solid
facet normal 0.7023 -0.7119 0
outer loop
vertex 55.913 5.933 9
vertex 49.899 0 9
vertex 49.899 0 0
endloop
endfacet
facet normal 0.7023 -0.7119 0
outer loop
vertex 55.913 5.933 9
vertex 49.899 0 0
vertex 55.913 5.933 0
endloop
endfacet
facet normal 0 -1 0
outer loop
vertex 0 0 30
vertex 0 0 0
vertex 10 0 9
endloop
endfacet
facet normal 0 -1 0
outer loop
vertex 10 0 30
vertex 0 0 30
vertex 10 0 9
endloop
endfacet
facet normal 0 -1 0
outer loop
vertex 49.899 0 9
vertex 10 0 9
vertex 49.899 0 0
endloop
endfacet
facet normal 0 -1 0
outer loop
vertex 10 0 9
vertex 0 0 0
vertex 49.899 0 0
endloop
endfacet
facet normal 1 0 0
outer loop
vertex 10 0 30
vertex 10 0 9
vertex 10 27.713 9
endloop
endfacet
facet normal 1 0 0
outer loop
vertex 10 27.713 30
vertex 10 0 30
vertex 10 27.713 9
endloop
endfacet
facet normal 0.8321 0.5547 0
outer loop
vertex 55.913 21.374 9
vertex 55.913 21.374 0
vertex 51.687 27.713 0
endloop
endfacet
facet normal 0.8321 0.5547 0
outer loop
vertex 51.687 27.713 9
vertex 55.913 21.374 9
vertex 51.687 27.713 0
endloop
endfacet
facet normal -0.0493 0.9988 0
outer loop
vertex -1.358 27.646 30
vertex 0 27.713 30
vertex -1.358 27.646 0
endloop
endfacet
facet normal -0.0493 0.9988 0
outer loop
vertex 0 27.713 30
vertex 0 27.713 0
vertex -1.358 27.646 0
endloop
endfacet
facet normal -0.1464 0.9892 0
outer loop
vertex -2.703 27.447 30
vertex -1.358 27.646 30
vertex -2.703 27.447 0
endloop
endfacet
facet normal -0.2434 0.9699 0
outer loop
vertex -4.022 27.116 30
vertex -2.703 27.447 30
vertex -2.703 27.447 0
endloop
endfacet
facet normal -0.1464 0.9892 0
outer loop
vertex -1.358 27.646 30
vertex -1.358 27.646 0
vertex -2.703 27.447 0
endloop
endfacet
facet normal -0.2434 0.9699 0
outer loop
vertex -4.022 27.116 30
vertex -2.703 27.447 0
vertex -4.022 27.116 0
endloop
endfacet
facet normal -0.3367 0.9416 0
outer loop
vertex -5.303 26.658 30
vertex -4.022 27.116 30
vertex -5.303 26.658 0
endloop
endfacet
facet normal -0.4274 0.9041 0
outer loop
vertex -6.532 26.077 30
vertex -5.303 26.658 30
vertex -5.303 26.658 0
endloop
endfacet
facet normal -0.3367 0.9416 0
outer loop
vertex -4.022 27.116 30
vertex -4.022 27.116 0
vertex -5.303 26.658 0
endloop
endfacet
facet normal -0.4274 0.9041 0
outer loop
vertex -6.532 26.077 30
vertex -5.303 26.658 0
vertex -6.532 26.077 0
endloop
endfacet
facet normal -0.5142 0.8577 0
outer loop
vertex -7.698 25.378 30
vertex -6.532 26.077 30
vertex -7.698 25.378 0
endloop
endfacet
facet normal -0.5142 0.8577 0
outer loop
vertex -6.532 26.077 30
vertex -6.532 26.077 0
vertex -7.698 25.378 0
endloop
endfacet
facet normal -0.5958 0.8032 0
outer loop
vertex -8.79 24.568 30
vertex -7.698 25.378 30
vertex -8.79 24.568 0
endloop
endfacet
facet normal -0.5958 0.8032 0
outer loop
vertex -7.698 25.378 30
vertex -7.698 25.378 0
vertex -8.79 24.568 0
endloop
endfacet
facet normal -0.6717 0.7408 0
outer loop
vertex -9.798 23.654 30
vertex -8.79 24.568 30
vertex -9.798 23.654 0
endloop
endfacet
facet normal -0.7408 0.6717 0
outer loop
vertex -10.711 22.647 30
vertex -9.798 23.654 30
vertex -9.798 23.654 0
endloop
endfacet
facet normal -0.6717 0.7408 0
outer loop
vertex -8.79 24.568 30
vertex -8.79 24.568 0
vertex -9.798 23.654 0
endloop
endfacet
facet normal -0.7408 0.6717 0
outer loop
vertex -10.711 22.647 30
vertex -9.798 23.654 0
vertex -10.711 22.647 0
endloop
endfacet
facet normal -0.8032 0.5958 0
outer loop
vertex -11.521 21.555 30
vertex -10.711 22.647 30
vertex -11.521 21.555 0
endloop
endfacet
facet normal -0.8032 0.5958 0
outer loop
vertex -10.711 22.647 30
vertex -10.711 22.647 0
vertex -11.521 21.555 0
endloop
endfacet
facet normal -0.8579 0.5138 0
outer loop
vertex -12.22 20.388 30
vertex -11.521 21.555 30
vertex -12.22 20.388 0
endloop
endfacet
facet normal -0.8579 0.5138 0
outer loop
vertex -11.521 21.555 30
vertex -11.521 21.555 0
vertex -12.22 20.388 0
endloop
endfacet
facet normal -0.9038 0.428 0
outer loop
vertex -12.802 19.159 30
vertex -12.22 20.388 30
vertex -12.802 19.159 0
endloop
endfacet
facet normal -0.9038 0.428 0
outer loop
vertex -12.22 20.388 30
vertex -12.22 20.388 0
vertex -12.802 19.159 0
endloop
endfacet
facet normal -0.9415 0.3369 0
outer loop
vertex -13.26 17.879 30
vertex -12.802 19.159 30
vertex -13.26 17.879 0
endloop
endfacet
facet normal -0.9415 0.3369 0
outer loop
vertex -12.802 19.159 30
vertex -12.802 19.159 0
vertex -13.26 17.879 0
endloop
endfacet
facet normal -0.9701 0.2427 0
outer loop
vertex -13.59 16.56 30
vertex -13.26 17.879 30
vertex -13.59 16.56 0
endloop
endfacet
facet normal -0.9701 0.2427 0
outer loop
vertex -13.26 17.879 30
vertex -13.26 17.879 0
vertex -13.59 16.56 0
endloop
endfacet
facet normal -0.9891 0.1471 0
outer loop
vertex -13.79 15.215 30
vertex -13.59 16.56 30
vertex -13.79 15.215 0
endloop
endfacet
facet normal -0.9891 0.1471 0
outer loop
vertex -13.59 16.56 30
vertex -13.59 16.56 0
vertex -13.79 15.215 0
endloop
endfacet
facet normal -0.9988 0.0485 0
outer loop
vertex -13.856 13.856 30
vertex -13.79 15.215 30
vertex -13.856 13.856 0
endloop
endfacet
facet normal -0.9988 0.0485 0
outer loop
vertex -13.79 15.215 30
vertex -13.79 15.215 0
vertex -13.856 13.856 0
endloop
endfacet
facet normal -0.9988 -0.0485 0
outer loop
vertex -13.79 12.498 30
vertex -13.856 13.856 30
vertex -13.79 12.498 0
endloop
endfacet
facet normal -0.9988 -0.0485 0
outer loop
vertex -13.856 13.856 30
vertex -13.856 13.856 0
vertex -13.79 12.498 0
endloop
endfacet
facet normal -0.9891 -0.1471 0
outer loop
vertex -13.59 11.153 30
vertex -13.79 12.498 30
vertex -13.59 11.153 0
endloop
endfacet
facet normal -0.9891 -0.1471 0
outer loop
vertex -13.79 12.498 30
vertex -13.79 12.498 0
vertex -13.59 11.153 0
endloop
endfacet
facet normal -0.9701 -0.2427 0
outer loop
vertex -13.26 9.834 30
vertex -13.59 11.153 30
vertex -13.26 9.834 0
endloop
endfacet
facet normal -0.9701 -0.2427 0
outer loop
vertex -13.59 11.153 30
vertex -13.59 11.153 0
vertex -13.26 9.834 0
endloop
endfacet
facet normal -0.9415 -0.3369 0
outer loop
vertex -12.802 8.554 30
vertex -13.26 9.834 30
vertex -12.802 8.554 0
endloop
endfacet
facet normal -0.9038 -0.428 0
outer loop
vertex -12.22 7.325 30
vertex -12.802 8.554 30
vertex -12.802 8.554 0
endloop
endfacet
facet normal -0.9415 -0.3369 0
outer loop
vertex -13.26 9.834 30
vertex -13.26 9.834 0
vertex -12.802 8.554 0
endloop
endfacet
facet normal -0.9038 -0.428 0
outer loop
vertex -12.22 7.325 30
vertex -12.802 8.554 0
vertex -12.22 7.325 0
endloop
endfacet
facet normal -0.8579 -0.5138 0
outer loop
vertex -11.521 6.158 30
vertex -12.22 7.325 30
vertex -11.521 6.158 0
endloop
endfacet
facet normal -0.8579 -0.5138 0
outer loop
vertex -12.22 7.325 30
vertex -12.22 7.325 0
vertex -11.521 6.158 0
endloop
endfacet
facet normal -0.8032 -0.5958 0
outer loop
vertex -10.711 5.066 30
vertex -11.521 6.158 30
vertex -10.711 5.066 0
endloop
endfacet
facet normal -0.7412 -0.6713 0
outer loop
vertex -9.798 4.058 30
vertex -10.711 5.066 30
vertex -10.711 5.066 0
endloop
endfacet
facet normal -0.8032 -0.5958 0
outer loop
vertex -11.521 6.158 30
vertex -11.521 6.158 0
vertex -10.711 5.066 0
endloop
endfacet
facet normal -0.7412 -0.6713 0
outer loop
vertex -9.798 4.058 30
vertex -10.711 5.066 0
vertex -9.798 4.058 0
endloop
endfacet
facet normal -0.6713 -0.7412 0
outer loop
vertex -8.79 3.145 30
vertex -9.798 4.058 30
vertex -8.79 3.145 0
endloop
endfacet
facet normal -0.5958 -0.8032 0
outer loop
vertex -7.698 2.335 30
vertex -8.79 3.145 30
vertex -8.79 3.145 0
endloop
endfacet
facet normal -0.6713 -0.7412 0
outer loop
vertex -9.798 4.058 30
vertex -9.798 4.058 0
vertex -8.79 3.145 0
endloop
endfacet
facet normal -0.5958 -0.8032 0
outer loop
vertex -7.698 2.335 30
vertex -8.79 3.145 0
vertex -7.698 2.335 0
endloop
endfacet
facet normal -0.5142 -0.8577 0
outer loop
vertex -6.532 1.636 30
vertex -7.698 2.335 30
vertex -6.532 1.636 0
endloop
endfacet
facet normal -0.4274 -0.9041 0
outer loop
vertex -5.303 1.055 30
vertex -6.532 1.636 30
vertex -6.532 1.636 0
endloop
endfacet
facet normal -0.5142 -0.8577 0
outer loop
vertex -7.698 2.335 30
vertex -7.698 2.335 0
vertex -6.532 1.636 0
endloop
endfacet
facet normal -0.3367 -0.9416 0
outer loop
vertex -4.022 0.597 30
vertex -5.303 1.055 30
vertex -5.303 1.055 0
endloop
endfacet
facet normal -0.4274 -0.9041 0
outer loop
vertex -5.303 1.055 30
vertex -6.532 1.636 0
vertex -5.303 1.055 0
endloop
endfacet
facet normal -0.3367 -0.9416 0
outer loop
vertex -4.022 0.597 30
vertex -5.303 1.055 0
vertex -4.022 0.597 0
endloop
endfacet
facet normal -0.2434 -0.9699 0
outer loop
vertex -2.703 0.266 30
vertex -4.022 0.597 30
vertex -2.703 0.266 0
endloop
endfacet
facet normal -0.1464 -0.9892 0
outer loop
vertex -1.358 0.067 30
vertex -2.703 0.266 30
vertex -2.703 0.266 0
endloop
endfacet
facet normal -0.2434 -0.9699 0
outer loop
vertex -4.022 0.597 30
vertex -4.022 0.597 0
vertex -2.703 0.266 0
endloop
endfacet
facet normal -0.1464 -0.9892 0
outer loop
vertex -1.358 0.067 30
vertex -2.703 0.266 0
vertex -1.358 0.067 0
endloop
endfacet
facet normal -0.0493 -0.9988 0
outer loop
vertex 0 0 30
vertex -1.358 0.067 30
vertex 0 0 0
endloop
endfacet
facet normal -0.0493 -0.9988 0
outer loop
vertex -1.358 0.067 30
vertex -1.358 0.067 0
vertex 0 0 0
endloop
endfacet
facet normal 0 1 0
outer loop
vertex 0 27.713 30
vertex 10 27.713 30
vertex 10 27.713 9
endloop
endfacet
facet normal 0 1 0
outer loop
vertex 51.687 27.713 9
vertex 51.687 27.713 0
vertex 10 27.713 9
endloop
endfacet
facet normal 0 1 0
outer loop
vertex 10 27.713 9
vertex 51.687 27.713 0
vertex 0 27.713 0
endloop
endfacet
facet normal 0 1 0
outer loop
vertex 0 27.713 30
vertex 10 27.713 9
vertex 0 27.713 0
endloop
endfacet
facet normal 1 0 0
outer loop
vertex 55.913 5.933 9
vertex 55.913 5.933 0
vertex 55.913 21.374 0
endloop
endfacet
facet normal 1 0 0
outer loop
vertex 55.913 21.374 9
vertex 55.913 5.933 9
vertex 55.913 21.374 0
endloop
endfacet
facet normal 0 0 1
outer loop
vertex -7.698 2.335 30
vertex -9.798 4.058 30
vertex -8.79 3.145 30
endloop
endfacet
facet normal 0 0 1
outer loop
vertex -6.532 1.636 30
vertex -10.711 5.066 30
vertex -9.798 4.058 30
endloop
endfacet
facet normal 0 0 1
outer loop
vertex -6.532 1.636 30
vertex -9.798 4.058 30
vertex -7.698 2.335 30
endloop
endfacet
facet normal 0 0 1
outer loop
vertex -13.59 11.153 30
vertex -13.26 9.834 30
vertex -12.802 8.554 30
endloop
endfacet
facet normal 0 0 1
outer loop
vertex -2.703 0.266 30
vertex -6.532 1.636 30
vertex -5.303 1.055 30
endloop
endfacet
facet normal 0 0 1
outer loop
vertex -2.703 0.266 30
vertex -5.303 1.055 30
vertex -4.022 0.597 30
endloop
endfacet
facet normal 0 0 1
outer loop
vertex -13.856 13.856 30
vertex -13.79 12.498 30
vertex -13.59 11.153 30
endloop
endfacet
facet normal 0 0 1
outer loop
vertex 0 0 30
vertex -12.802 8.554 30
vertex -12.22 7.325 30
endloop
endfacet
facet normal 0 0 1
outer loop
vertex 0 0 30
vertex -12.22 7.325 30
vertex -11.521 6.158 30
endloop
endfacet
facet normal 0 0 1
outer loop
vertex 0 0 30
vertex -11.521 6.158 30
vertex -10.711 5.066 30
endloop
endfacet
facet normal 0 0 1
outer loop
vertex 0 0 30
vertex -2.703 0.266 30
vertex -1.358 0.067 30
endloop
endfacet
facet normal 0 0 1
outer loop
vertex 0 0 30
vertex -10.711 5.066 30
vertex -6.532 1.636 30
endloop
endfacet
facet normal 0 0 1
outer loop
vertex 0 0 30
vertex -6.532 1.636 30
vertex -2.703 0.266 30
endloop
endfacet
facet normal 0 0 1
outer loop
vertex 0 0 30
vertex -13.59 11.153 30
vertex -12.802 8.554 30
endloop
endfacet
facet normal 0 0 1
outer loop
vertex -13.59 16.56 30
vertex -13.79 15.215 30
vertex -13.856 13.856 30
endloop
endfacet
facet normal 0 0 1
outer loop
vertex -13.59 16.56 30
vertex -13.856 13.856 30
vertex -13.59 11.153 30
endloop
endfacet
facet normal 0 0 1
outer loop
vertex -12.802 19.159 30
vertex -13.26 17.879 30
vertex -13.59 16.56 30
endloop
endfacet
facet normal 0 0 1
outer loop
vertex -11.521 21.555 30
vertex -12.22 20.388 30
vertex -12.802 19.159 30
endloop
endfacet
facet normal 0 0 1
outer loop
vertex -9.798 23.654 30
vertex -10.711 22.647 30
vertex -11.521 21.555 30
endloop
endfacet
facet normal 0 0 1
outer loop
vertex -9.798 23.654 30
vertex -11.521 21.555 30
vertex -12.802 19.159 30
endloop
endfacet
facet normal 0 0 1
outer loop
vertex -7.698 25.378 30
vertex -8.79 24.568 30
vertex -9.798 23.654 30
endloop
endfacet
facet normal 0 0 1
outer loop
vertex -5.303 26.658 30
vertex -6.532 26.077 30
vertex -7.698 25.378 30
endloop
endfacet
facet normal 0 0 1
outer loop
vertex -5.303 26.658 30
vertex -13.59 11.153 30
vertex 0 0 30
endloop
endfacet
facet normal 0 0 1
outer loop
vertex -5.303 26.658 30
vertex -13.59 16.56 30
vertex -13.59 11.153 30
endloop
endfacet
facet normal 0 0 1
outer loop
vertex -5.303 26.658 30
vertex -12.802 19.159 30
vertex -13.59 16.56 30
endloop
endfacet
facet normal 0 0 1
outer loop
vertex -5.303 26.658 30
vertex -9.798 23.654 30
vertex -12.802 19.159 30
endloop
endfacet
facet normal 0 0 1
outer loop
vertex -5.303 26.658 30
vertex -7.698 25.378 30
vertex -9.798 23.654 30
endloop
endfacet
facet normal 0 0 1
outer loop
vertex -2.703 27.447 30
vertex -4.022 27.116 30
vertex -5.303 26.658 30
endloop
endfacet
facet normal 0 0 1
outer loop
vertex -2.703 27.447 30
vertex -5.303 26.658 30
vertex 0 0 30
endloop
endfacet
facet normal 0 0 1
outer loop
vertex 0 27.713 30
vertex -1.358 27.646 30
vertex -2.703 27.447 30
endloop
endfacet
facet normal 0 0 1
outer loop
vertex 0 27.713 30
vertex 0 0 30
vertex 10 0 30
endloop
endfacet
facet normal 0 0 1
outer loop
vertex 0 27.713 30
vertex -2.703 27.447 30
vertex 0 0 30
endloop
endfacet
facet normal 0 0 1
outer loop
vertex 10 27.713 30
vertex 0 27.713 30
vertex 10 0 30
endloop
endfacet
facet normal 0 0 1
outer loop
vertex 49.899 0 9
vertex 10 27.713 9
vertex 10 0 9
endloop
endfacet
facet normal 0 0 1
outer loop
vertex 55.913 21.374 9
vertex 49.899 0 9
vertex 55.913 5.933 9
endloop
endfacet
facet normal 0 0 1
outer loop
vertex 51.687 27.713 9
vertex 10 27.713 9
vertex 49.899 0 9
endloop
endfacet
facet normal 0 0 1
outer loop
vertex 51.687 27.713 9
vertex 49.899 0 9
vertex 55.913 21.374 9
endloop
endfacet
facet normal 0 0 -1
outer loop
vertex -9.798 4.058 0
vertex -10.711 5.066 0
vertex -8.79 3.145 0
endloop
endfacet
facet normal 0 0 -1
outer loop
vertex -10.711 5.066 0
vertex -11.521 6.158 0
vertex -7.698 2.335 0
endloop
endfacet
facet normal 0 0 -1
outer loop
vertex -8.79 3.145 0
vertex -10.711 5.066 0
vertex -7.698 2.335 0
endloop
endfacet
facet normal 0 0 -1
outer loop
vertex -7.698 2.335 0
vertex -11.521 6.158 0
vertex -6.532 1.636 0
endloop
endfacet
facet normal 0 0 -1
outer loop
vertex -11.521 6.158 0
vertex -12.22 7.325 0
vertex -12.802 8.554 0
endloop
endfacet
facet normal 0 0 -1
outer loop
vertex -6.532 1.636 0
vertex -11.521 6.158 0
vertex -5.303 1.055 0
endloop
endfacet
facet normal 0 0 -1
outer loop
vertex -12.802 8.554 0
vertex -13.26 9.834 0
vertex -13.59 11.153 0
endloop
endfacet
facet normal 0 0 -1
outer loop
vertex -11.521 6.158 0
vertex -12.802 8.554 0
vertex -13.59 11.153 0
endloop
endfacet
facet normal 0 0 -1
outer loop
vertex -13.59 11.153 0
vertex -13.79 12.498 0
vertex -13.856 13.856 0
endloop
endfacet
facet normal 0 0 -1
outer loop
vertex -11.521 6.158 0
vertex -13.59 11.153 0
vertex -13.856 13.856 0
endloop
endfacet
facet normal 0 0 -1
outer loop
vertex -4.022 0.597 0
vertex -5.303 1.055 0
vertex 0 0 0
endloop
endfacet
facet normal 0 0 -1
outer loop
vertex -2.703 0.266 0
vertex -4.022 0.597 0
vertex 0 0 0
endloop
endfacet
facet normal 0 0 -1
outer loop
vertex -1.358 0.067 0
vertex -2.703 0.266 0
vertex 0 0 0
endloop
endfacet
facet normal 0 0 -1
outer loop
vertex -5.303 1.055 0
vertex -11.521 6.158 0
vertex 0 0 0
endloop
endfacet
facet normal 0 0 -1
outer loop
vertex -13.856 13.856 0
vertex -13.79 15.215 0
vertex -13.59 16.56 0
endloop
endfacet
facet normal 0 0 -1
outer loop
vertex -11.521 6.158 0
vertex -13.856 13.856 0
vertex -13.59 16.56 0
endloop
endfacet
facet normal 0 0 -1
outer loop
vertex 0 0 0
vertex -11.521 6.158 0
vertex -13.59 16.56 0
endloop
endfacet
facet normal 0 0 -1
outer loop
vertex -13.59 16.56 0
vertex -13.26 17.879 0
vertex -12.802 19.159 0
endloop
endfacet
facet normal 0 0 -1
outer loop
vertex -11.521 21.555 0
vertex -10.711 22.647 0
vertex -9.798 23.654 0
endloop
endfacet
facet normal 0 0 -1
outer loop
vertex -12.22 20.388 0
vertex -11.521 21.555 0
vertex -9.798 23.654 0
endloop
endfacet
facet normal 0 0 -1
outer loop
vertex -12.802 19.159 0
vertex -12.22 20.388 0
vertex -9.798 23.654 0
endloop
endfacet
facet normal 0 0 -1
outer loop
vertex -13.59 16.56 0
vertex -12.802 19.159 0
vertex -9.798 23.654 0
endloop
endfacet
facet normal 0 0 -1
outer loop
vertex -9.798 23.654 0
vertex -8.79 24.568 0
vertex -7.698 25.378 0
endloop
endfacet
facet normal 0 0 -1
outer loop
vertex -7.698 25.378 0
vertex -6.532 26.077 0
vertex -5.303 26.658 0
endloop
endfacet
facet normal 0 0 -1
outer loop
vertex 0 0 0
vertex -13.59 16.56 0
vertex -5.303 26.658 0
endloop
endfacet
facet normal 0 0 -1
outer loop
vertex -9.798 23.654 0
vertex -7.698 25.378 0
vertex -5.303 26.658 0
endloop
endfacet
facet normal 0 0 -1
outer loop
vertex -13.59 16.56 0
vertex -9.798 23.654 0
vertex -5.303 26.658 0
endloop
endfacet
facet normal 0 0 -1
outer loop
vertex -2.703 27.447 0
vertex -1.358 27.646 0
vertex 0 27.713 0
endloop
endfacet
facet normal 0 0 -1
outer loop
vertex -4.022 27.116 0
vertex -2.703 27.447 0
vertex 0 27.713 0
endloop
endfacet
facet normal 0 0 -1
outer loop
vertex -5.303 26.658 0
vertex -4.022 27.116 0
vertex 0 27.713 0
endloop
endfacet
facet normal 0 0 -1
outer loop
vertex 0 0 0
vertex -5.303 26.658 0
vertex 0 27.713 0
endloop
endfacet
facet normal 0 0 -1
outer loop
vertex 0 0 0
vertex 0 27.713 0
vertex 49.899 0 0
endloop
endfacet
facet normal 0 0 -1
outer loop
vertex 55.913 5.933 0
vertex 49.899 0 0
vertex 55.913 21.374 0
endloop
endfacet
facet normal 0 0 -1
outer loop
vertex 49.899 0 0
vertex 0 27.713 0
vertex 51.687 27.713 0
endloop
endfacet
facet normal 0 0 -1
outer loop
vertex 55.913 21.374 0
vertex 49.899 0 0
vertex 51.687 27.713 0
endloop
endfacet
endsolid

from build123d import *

# Parameters (mm, degrees)
F1_DEPTH = 9
F3_DEPTH = 21


with BuildPart() as f1:
    # F0 (on Top) → F1 (new body)
    with BuildSketch(Plane.XY):
        with BuildLine():
            ThreePointArc((0, 27.71285), (-13.856425, 13.856425), (0, 0))
            Line((0, 0), (49.899384, 0))
            Line((49.899384, 0), (55.913314, 5.932663))
            Line((55.913314, 5.932663), (55.913314, 21.37384))
            Line((55.913314, 21.37384), (51.687304, 27.71285))
            Line((51.687304, 27.71285), (0, 27.71285))
        make_face()
    extrude(amount=F1_DEPTH)

    # F2 (on face) → F3 (join)
    with BuildSketch(Plane.XY.offset(9)):
        with BuildLine():
            Line((10, 0), (10, 27.71285))
            Line((10, 27.71285), (0, 27.71285))
            ThreePointArc((0, 27.71285), (-13.856425, 13.856425), (0, 0))
            Line((0, 0), (10, 0))
        make_face()
    extrude(amount=F3_DEPTH)


solid = f1.part
